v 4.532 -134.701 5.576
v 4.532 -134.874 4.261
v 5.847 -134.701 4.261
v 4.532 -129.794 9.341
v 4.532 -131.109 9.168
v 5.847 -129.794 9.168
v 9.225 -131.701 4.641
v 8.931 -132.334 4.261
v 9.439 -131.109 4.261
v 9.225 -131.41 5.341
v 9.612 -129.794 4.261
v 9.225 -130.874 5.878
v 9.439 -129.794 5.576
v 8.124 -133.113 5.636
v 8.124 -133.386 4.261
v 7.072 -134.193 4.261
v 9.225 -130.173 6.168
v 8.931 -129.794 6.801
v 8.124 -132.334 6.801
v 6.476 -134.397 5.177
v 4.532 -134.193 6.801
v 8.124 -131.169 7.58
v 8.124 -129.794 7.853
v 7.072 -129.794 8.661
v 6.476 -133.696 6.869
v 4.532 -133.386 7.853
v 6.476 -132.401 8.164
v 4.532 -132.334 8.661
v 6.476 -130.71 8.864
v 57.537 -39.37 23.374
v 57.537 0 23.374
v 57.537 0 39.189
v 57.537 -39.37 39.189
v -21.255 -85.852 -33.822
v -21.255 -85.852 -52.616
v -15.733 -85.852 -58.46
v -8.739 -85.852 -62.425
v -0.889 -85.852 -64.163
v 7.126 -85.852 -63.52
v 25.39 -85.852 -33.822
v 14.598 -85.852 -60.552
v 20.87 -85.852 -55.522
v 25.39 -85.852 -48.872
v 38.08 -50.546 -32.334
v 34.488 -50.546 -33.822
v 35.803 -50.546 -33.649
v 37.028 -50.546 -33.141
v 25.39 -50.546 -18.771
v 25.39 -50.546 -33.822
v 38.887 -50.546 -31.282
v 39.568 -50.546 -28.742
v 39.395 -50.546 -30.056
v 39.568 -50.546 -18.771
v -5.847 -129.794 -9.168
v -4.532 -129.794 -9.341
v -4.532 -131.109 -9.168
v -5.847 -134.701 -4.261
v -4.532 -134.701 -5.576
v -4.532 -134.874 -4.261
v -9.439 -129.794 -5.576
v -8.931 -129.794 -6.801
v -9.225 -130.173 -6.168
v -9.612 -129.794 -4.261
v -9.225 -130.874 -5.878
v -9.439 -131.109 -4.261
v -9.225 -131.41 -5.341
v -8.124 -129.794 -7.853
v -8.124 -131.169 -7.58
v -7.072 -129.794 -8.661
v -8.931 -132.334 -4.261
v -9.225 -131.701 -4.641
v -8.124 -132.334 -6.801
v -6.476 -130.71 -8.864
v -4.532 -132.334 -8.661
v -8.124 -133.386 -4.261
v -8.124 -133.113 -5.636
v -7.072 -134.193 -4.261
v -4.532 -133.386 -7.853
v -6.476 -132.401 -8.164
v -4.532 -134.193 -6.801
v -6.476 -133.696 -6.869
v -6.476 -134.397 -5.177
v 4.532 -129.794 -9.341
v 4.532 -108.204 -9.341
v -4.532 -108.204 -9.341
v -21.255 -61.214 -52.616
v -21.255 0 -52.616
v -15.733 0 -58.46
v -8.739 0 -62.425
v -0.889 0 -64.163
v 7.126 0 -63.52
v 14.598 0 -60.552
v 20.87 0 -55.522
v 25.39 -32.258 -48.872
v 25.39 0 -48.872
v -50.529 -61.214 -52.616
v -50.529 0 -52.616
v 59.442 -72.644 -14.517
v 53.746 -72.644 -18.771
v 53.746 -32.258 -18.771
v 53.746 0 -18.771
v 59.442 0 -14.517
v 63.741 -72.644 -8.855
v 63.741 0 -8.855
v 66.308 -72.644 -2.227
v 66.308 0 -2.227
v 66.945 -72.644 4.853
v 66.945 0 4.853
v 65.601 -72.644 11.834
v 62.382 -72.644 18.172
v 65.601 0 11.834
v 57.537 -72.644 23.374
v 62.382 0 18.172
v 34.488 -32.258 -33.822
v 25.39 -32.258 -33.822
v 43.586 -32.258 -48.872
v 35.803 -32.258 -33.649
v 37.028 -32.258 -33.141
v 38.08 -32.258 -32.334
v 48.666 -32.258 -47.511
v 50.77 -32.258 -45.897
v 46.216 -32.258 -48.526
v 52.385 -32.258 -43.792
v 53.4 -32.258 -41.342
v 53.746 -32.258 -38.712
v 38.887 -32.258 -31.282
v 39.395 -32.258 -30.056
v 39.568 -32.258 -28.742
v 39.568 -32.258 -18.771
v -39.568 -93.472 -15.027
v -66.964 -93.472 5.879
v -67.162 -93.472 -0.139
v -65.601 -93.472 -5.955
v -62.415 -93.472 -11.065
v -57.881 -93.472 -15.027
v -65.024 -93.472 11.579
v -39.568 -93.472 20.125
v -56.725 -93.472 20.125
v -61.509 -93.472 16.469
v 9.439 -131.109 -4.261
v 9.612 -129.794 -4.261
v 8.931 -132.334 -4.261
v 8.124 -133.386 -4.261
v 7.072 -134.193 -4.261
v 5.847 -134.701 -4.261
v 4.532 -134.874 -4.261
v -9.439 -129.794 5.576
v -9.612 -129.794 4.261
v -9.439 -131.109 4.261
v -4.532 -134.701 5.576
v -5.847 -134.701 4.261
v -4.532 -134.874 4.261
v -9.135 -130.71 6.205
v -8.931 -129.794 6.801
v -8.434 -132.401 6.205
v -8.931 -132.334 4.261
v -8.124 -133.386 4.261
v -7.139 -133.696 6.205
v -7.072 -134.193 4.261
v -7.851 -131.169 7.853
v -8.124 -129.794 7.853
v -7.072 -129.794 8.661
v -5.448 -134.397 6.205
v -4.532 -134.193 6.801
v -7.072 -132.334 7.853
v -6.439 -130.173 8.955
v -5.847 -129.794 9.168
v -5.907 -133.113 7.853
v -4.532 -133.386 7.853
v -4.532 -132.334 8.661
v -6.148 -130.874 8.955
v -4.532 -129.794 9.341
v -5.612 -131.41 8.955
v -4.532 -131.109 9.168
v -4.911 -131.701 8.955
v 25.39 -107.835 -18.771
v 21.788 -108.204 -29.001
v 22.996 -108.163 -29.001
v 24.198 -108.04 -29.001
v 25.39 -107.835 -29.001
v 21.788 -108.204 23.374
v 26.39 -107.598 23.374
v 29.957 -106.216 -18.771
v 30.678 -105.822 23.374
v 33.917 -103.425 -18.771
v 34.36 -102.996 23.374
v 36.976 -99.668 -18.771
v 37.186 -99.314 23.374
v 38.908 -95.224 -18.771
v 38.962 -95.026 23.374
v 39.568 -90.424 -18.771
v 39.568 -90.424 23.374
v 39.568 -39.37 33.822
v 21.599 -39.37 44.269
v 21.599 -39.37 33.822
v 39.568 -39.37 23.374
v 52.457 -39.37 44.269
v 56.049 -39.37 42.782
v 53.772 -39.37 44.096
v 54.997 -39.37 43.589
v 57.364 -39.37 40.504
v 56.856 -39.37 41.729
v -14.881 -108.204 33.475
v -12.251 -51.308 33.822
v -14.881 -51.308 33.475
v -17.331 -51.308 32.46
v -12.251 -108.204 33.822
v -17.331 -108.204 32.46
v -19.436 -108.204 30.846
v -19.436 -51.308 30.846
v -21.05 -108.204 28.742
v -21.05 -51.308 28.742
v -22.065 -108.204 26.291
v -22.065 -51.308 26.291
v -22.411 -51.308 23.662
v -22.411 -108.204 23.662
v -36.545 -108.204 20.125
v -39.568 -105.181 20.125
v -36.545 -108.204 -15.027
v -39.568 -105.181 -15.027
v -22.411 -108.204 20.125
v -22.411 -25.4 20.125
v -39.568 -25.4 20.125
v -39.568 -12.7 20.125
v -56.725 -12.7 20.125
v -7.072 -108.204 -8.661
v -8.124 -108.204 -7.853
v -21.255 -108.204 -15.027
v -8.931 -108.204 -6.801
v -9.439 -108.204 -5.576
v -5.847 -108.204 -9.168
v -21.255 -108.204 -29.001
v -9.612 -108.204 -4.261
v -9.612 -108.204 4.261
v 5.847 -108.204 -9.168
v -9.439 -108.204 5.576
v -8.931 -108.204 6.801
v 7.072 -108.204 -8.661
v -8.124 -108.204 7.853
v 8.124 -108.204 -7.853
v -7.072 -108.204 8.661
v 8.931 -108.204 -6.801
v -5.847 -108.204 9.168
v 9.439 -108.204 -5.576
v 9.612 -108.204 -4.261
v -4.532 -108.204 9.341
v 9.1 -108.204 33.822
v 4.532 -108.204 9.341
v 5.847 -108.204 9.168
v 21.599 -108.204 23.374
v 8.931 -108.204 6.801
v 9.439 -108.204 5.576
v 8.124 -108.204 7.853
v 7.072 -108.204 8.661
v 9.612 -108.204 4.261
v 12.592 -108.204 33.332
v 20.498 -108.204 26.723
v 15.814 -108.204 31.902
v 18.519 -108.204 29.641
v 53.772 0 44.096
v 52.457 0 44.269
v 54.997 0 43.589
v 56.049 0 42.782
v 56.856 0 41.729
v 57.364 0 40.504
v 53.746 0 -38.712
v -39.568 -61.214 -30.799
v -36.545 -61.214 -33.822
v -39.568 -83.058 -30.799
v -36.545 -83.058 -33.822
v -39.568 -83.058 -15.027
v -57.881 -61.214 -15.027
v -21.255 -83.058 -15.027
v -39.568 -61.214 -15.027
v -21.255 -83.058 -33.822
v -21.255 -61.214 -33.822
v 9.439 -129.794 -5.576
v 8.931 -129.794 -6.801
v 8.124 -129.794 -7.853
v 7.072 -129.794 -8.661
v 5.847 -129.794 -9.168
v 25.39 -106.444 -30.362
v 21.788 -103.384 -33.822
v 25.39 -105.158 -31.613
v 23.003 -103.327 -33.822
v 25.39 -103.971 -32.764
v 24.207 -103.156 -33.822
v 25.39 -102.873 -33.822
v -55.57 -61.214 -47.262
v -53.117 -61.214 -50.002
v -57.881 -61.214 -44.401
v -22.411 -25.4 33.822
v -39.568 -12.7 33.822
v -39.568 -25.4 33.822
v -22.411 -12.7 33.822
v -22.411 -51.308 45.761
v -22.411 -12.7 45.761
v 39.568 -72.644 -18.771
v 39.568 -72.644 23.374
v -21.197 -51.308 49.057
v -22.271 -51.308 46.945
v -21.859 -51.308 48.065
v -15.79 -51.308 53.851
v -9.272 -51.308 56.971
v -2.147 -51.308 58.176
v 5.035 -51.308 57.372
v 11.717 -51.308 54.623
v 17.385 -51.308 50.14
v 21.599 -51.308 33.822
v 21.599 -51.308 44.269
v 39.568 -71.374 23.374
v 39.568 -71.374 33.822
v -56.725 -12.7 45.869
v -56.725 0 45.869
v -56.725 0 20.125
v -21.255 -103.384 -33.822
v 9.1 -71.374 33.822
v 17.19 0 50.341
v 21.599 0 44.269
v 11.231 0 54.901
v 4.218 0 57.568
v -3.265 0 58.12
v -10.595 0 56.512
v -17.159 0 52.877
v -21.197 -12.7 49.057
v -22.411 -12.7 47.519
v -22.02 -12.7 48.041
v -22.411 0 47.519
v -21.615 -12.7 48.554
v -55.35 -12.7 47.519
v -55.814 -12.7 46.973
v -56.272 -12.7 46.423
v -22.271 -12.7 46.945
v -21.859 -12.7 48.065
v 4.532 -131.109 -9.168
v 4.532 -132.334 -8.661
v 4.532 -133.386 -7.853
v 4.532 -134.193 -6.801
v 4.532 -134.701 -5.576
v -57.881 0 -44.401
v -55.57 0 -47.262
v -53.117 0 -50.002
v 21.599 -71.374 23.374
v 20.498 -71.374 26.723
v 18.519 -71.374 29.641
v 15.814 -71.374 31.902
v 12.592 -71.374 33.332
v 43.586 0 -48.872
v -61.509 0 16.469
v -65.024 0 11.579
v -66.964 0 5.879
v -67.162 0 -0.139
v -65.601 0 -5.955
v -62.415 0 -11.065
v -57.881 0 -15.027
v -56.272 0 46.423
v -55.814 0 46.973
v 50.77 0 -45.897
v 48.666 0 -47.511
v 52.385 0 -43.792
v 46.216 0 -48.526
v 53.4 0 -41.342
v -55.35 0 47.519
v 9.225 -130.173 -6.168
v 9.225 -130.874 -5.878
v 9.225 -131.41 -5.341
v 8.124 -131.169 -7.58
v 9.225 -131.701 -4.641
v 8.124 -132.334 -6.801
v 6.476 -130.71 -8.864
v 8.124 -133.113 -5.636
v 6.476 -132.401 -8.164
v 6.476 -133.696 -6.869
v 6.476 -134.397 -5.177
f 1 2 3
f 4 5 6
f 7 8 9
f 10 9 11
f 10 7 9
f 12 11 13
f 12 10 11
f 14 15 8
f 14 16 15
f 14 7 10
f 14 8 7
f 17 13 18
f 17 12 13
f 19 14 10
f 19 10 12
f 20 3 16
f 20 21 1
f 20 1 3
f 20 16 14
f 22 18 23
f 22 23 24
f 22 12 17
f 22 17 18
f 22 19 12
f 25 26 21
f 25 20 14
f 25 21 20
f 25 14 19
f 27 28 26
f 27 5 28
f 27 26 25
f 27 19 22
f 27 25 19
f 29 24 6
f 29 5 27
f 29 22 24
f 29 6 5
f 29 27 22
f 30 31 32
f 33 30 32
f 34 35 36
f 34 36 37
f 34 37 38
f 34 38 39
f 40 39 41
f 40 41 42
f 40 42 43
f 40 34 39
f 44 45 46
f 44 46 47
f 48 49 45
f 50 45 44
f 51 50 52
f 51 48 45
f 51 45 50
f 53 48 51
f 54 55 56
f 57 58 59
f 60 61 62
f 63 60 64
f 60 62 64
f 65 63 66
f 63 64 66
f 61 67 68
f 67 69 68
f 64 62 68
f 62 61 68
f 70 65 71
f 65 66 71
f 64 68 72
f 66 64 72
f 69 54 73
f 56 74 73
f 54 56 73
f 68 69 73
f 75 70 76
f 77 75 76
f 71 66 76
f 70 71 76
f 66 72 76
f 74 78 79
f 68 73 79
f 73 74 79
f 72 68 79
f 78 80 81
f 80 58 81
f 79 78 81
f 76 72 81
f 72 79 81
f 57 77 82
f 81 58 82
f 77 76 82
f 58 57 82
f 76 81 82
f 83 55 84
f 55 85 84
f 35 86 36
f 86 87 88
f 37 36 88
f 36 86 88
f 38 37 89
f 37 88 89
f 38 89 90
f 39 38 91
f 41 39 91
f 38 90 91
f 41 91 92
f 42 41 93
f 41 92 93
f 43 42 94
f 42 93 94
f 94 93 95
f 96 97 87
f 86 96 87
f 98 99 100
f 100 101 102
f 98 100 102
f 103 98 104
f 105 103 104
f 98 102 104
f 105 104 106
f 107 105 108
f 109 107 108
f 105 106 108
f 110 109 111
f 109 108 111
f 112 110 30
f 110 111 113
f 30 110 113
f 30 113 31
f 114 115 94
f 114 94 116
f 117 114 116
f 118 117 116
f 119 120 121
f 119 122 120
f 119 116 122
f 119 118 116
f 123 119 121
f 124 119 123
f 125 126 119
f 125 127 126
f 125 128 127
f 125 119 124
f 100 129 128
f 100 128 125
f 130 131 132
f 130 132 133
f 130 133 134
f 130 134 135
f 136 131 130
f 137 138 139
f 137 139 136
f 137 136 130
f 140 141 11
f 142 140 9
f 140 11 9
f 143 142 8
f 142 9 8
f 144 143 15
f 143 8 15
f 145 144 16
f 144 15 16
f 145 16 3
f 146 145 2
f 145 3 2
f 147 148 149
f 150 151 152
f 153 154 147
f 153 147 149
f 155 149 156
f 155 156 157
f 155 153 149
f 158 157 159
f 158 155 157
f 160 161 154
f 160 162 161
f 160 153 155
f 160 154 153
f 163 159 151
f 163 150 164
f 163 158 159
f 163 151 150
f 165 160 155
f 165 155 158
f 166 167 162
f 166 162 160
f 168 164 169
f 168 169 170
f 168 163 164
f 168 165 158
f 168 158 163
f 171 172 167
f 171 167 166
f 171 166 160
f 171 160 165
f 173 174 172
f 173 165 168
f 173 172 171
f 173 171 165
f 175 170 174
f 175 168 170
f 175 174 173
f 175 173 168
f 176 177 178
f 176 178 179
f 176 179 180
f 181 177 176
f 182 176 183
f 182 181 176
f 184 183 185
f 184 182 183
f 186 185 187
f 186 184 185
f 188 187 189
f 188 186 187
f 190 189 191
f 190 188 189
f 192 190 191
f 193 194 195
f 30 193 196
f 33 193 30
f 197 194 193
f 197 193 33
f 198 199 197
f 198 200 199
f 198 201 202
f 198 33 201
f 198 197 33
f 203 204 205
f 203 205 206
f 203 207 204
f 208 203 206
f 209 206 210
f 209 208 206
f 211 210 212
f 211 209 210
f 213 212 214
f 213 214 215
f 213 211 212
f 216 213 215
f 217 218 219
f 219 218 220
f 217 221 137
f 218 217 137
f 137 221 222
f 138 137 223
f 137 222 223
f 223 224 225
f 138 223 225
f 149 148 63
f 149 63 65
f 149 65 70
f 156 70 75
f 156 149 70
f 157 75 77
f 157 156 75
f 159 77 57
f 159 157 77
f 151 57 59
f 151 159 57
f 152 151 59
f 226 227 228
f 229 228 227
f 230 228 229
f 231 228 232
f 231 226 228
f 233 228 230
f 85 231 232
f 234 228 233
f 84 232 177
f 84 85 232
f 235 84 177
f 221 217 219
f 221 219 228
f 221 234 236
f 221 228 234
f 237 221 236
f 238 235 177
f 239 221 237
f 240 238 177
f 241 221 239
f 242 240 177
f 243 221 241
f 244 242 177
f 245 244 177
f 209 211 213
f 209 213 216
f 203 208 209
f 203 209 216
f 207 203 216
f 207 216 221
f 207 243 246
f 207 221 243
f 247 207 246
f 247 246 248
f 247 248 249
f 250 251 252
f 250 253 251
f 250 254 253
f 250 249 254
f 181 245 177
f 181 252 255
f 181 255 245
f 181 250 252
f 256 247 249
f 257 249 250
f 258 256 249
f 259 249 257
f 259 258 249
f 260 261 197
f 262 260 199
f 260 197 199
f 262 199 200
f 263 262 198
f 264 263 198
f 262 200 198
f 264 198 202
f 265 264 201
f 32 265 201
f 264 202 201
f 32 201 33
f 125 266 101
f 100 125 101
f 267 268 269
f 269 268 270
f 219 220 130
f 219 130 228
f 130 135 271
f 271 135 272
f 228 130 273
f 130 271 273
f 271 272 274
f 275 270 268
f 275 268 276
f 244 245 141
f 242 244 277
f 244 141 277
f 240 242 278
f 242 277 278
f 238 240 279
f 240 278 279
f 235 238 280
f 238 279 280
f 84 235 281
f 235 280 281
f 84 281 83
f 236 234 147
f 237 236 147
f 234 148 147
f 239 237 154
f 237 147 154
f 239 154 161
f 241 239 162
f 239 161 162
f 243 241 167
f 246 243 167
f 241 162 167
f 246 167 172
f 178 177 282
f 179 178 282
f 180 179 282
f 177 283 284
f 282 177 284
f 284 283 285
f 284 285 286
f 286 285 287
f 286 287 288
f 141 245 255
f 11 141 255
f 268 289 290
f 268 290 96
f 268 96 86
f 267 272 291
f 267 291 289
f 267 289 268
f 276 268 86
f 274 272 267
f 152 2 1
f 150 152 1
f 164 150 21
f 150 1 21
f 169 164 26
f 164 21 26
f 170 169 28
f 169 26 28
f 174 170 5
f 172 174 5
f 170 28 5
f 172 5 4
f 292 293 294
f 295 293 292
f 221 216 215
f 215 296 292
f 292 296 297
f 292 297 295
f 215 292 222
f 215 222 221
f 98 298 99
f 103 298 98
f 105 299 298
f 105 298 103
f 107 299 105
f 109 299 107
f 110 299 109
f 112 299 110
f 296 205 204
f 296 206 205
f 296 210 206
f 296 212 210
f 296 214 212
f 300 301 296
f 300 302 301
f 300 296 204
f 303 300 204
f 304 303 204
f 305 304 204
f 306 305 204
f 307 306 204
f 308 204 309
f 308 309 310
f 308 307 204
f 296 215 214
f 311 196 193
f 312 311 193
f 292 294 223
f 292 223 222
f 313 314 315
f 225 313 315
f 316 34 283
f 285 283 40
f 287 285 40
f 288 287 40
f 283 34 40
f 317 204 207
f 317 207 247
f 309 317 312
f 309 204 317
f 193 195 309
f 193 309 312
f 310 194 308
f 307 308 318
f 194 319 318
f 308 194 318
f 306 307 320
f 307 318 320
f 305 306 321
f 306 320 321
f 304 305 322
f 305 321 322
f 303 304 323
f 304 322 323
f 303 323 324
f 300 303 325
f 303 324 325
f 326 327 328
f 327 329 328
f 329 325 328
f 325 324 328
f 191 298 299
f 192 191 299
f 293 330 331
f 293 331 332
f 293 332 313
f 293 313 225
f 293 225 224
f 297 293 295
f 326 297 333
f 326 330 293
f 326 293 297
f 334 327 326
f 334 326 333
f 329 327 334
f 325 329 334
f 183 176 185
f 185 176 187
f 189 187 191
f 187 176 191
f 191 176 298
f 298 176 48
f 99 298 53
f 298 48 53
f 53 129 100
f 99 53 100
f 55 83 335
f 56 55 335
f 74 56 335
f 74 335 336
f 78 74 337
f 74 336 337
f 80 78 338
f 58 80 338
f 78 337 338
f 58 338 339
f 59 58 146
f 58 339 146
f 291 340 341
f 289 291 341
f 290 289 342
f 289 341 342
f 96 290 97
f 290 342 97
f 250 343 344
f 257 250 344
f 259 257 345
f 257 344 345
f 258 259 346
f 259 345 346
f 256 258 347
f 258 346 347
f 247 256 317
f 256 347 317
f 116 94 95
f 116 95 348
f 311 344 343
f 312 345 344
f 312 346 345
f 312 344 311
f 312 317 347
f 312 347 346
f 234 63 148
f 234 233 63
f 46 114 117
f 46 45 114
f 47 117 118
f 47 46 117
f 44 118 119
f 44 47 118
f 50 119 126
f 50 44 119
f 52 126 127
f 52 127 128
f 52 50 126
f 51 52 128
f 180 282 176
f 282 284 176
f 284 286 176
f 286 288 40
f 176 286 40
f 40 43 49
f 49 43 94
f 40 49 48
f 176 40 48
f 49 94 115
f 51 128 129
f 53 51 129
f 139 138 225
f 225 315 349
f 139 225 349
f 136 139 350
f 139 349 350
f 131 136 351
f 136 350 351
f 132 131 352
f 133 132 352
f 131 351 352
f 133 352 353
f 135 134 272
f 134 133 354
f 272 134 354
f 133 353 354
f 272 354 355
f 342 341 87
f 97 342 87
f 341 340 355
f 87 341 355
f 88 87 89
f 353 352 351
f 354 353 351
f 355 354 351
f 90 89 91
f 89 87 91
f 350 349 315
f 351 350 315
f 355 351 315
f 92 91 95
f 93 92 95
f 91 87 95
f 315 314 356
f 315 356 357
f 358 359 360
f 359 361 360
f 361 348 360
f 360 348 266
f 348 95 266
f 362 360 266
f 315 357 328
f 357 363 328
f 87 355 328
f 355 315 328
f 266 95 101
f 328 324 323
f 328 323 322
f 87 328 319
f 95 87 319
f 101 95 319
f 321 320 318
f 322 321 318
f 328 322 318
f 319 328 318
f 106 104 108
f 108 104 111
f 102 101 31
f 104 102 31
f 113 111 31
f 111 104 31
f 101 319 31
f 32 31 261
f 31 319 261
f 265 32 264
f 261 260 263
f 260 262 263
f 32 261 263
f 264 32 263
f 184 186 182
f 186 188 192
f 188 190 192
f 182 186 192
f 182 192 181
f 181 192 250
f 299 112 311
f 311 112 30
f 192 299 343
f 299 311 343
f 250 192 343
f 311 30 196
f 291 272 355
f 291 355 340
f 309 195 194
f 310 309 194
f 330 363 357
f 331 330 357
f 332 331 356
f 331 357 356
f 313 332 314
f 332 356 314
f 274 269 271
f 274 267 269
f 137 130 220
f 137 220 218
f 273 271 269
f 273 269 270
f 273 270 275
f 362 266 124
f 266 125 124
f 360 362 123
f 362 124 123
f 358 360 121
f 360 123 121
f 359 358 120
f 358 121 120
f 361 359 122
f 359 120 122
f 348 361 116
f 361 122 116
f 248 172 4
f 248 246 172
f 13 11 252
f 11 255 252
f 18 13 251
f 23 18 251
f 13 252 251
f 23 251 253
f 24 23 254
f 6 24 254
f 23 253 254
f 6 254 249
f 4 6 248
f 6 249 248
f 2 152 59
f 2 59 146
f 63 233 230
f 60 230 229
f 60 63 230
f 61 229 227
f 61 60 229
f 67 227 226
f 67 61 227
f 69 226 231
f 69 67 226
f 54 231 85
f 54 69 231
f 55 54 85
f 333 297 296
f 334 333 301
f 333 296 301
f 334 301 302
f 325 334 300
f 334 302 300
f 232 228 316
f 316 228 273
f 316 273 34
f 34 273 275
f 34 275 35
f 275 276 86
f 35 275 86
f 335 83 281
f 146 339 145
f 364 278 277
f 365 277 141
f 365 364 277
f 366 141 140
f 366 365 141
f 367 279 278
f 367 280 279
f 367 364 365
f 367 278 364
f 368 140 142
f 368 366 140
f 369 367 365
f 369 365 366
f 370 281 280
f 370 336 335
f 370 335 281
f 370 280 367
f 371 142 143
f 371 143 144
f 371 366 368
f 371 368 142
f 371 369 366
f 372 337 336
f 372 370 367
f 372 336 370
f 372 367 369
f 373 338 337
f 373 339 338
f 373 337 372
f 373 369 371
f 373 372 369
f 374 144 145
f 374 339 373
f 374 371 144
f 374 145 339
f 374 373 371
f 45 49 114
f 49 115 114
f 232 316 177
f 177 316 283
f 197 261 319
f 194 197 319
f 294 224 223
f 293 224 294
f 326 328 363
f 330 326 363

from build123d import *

# Parameters (mm, degrees)
F0_W         = 19.224062562
F0_H         = 18.6825376004
F1_DEPTH     = 134.874
F2_DEPTH     = 108.204
F0_W_2       = 18.3131638914
F0_H_2       = 18.7943680212
F3_DEPTH     = 83.058
F0_W_3       = 17.1565823257
F0_H_3       = 13.6970020831
F4_DEPTH     = 25.4
F0_W_4       = 17.9688669741
F0_H_4       = 10.4478634894
F5_DEPTH     = 71.374
F0_W_5       = 14.1782090068
F0_H_5       = 15.0508098304
F6_DEPTH     = 50.546
F7_DEPTH     = 72.644
F8_DEPTH     = 85.852
F9_DEPTH     = 51.308
F10_DEPTH    = 93.472
F11_DEPTH    = 61.214
F12_DEPTH    = 32.258
F13_DEPTH    = 39.37
F14_DEPTH    = 12.7
F15_R        = 5.08
F16_R        = 10.16
F17_R        = 5.08
F18_T1_DEPTH = 68.0767879487
F19_R        = 10.16
F20_SIZE     = 3.0226
F21_R        = 17.78
F22_SIZE     = 4.8203104
F23_R        = 5.08
F24_R        = 5.08
F25_R        = 5.08
F26_R        = 5.08
F27_R        = 5.08


# Not quite as in the source:
# - a fillet or chamfer that OpenCascade refuses, or shapes differently, is made with other operations: its cross-section is extruded or revolved along the edge and cut away or added


with BuildPart() as f1:
    # F0 (on Front) → F1 (new body)
    with BuildSketch(Plane.XZ):
        Rectangle(F0_W, F0_H)
    extrude(amount=F1_DEPTH)

    # F0 (on Front) → F2 (join)
    with BuildSketch(Plane.XZ):
        Polygon((-21.2547723204, -33.8216274977), (25.389727205, -33.8216274977), (25.389727205, -18.7708176672), (39.5679362118, -18.7708176672), (39.5679362118, 23.3737640083), (21.5990692377, 23.3737640083), (21.5990692377, 33.8216274977), (-22.4113538861, 33.8216274977), (-22.4113538861, 20.1246254146), (-39.5679362118, 20.1246254146), (-39.5679362118, -15.0272594765), (-21.2547723204, -15.0272594765), align=None)
        Rectangle(F0_W, F0_H, mode=Mode.SUBTRACT)
    extrude(amount=F2_DEPTH)

    # F0 (on Front) → F3 (join)
    with BuildSketch(Plane.XZ):
        with Locations((-30.4113542661, -24.4244434871)):
            Rectangle(F0_W_2, F0_H_2)
    extrude(amount=F3_DEPTH)

    # F0 (on Front) → F4 (join)
    with BuildSketch(Plane.XZ):
        with Locations((-30.989645049, 26.9731264561)):
            Rectangle(F0_W_3, F0_H_3)
    extrude(amount=F4_DEPTH)

    # F0 (on Front) → F5 (join)
    with BuildSketch(Plane.XZ):
        with Locations((30.5835027248, 28.597695753)):
            Rectangle(F0_W_4, F0_H_4)
    extrude(amount=F5_DEPTH)

    # F0 (on Front) → F6 (join)
    with BuildSketch(Plane.XZ):
        with Locations((32.4788317084, -26.2962225825)):
            Rectangle(F0_W_5, F0_H_5)
    extrude(amount=F6_DEPTH)

    # F0 (on Front) → F7 (join)
    with BuildSketch(Plane.XZ):
        with BuildLine():
            Line((39.5679362118, 23.3737640083), (39.5679362118, -18.7708176672))
            Line((39.5679362118, -18.7708176672), (53.7461452186, -18.7708176672))
            ThreePointArc((53.7461452186, -18.7708176672), (66.8748667644, 1.2910953871), (57.5368031859, 23.3737640083))
            Line((57.5368031859, 23.3737640083), (39.5679362118, 23.3737640083))
        make_face()
    extrude(amount=F7_DEPTH)

    # F0 (on Front) → F8 (join)
    with BuildSketch(Plane.XZ):
        with BuildLine():
            Line((25.389727205, -48.8724373281), (25.389727205, -33.8216274977))
            Line((25.389727205, -33.8216274977), (-21.2547723204, -33.8216274977))
            Line((-21.2547723204, -33.8216274977), (-21.2547723204, -52.6159955189))
            ThreePointArc((-21.2547723204, -52.6159955189), (3.1426231279, -64.1404640217), (25.389727205, -48.8724373281))
        make_face()
    extrude(amount=F8_DEPTH)

    # F0 (on Front) → F9 (join)
    with BuildSketch(Plane.XZ):
        with BuildLine():
            Line((-22.4113538861, 33.8216274977), (21.5990692377, 33.8216274977))
            Line((21.5990692377, 33.8216274977), (21.5990692377, 44.2694909871))
            ThreePointArc((21.5990692377, 44.2694909871), (0.4961178031, 58.1154072117), (-22.4113538861, 47.5186295807))
            Line((-22.4113538861, 47.5186295807), (-22.4113538861, 33.8216274977))
        make_face()
    extrude(amount=F9_DEPTH)

    # F0 (on Front) → F10 (join)
    with BuildSketch(Plane.XZ):
        with BuildLine():
            Line((-57.8811001033, -15.0272594765), (-39.5679362118, -15.0272594765))
            Line((-39.5679362118, -15.0272594765), (-39.5679362118, 20.1246254146))
            Line((-39.5679362118, 20.1246254146), (-56.7245185375, 20.1246254146))
            ThreePointArc((-56.7245185375, 20.1246254146), (-67.2856136398, 2.8771412434), (-57.8811001033, -15.0272594765))
        make_face()
    extrude(amount=F10_DEPTH)

    # F0 (on Front) → F11 (join)
    with BuildSketch(Plane.XZ):
        with BuildLine():
            Line((-21.2547723204, -52.6159955189), (-21.2547723204, -33.8216274977))
            Line((-21.2547723204, -33.8216274977), (-39.5679362118, -33.8216274977))
            Line((-39.5679362118, -33.8216274977), (-39.5679362118, -15.0272594765))
            Line((-39.5679362118, -15.0272594765), (-57.8811001033, -15.0272594765))
            Line((-57.8811001033, -15.0272594765), (-57.8811001033, -44.4008079084))
            ThreePointArc((-57.8811001033, -44.4008079084), (-54.3606128257, -48.647479537), (-50.5293034549, -52.6159955189))
            Line((-50.5293034549, -52.6159955189), (-21.2547723204, -52.6159955189))
        make_face()
    extrude(amount=F11_DEPTH)

    # F0 (on Front) → F12 (join)
    with BuildSketch(Plane.XZ):
        Polygon((39.5679362118, -18.7708176672), (39.5679362118, -33.8216274977), (25.389727205, -33.8216274977), (25.389727205, -48.8724373281), (53.7461452186, -48.8724373281), (53.7461452186, -18.7708176672), align=None)
    extrude(amount=F12_DEPTH)

    # F0 (on Front) → F13 (join)
    with BuildSketch(Plane.XZ):
        Polygon((39.5679362118, 33.8216274977), (39.5679362118, 23.3737640083), (57.5368031859, 23.3737640083), (57.5368031859, 44.2694909871), (21.5990692377, 44.2694909871), (21.5990692377, 33.8216274977), align=None)
    extrude(amount=F13_DEPTH)

    # F0 (on Front) → F14 (join)
    with BuildSketch(Plane.XZ):
        with BuildLine():
            Line((-56.7245185375, 20.1246254146), (-39.5679362118, 20.1246254146))
            Line((-39.5679362118, 20.1246254146), (-39.5679362118, 33.8216274977))
            Line((-39.5679362118, 33.8216274977), (-22.4113538861, 33.8216274977))
            Line((-22.4113538861, 33.8216274977), (-22.4113538861, 47.5186295807))
            Line((-22.4113538861, 47.5186295807), (-55.3500978757, 47.5186295807))
            ThreePointArc((-55.3500978757, 47.5186295807), (-56.0433767246, 46.6989659134), (-56.7245185375, 45.8691888828))
            Line((-56.7245185375, 45.8691888828), (-56.7245185375, 20.1246254146))
        make_face()
    extrude(amount=F14_DEPTH)

    # F15
    f15_edges = [f1.edges().sort_by_distance(p)[0] for p in [
        (57.536803, -19.685, 44.269491),
    ]]
    fillet(f15_edges, radius=F15_R)

    # F16
    f16_edges = [f1.edges().sort_by_distance(p)[0] for p in [
        (53.746145, -16.129, -48.872437),
    ]]
    fillet(f16_edges, radius=F16_R)

    # F17
    f17_edges = [f1.edges().sort_by_distance(p)[0] for p in [
        (39.567936, -41.402, -33.821627),
    ]]
    fillet(f17_edges, radius=F17_R)

    # F18: fillet of radius 12.7 on 1 edges, made by hand

    # F18_s2 → F18_t1 (cut)
    with BuildSketch(Plane.XZ.offset(71.374)):
        with BuildLine():
            ThreePointArc((21.5990692377, 23.3737640083), (17.2455325804, 30.8656547371), (9.1003540582, 33.8216274977))
            Line((9.1003540582, 33.8216274977), (21.5990692377, 33.8216274977))
            Line((21.5990692377, 33.8216274977), (21.5990692377, 23.3737640083))
        make_face()
    extrude(amount=F18_T1_DEPTH, mode=Mode.SUBTRACT)

    # F19
    f19_edges = [f1.edges().sort_by_distance(p)[0] for p in [
        (-22.411354, -79.756, 33.821627),
    ]]
    fillet(f19_edges, radius=F19_R)

    # F20
    f20_edges = [f1.edges().sort_by_distance(p)[0] for p in [
        (-39.567936, -72.136, -33.821627),
        (-39.567936, -108.204, 2.548683),
    ]]
    chamfer(f20_edges, length=F20_SIZE)

    # F21
    f21_edges = [f1.edges().sort_by_distance(p)[0] for p in [
        (39.567936, -108.204, 2.301473),
    ]]
    fillet(f21_edges, radius=F21_R)

    # F22
    f22_edges = [f1.edges().sort_by_distance(p)[0] for p in [
        (0.266582, -108.204, -33.821627),
        (23.59824, -108.1116, -33.821627),
    ]]
    chamfer(f22_edges, length=F22_SIZE)

    # F23
    f23_edges = [f1.edges().sort_by_distance(p)[0] for p in [
        (0, -134.874, -9.341269),
    ]]
    fillet(f23_edges, radius=F23_R)

    # F24
    f24_edges = [f1.edges().sort_by_distance(p)[0] for p in [
        (-9.612031, -134.874, 2.54),
    ]]
    fillet(f24_edges, radius=F24_R)

    # F25
    f25_edges = [f1.edges().sort_by_distance(p)[0] for p in [
        (2.54, -134.874, 9.341269),
    ]]
    fillet(f25_edges, radius=F25_R)

    # F26
    f26_edges = [f1.edges().sort_by_distance(p)[0] for p in [
        (9.612031, -134.874, 0),
    ]]
    fillet(f26_edges, radius=F26_R)

    # F27
    f27_edges = [f1.edges().sort_by_distance(p)[0] for p in [
        (-22.411354, -32.004, 47.51863),
    ]]
    fillet(f27_edges, radius=F27_R)


solid = f1.part
